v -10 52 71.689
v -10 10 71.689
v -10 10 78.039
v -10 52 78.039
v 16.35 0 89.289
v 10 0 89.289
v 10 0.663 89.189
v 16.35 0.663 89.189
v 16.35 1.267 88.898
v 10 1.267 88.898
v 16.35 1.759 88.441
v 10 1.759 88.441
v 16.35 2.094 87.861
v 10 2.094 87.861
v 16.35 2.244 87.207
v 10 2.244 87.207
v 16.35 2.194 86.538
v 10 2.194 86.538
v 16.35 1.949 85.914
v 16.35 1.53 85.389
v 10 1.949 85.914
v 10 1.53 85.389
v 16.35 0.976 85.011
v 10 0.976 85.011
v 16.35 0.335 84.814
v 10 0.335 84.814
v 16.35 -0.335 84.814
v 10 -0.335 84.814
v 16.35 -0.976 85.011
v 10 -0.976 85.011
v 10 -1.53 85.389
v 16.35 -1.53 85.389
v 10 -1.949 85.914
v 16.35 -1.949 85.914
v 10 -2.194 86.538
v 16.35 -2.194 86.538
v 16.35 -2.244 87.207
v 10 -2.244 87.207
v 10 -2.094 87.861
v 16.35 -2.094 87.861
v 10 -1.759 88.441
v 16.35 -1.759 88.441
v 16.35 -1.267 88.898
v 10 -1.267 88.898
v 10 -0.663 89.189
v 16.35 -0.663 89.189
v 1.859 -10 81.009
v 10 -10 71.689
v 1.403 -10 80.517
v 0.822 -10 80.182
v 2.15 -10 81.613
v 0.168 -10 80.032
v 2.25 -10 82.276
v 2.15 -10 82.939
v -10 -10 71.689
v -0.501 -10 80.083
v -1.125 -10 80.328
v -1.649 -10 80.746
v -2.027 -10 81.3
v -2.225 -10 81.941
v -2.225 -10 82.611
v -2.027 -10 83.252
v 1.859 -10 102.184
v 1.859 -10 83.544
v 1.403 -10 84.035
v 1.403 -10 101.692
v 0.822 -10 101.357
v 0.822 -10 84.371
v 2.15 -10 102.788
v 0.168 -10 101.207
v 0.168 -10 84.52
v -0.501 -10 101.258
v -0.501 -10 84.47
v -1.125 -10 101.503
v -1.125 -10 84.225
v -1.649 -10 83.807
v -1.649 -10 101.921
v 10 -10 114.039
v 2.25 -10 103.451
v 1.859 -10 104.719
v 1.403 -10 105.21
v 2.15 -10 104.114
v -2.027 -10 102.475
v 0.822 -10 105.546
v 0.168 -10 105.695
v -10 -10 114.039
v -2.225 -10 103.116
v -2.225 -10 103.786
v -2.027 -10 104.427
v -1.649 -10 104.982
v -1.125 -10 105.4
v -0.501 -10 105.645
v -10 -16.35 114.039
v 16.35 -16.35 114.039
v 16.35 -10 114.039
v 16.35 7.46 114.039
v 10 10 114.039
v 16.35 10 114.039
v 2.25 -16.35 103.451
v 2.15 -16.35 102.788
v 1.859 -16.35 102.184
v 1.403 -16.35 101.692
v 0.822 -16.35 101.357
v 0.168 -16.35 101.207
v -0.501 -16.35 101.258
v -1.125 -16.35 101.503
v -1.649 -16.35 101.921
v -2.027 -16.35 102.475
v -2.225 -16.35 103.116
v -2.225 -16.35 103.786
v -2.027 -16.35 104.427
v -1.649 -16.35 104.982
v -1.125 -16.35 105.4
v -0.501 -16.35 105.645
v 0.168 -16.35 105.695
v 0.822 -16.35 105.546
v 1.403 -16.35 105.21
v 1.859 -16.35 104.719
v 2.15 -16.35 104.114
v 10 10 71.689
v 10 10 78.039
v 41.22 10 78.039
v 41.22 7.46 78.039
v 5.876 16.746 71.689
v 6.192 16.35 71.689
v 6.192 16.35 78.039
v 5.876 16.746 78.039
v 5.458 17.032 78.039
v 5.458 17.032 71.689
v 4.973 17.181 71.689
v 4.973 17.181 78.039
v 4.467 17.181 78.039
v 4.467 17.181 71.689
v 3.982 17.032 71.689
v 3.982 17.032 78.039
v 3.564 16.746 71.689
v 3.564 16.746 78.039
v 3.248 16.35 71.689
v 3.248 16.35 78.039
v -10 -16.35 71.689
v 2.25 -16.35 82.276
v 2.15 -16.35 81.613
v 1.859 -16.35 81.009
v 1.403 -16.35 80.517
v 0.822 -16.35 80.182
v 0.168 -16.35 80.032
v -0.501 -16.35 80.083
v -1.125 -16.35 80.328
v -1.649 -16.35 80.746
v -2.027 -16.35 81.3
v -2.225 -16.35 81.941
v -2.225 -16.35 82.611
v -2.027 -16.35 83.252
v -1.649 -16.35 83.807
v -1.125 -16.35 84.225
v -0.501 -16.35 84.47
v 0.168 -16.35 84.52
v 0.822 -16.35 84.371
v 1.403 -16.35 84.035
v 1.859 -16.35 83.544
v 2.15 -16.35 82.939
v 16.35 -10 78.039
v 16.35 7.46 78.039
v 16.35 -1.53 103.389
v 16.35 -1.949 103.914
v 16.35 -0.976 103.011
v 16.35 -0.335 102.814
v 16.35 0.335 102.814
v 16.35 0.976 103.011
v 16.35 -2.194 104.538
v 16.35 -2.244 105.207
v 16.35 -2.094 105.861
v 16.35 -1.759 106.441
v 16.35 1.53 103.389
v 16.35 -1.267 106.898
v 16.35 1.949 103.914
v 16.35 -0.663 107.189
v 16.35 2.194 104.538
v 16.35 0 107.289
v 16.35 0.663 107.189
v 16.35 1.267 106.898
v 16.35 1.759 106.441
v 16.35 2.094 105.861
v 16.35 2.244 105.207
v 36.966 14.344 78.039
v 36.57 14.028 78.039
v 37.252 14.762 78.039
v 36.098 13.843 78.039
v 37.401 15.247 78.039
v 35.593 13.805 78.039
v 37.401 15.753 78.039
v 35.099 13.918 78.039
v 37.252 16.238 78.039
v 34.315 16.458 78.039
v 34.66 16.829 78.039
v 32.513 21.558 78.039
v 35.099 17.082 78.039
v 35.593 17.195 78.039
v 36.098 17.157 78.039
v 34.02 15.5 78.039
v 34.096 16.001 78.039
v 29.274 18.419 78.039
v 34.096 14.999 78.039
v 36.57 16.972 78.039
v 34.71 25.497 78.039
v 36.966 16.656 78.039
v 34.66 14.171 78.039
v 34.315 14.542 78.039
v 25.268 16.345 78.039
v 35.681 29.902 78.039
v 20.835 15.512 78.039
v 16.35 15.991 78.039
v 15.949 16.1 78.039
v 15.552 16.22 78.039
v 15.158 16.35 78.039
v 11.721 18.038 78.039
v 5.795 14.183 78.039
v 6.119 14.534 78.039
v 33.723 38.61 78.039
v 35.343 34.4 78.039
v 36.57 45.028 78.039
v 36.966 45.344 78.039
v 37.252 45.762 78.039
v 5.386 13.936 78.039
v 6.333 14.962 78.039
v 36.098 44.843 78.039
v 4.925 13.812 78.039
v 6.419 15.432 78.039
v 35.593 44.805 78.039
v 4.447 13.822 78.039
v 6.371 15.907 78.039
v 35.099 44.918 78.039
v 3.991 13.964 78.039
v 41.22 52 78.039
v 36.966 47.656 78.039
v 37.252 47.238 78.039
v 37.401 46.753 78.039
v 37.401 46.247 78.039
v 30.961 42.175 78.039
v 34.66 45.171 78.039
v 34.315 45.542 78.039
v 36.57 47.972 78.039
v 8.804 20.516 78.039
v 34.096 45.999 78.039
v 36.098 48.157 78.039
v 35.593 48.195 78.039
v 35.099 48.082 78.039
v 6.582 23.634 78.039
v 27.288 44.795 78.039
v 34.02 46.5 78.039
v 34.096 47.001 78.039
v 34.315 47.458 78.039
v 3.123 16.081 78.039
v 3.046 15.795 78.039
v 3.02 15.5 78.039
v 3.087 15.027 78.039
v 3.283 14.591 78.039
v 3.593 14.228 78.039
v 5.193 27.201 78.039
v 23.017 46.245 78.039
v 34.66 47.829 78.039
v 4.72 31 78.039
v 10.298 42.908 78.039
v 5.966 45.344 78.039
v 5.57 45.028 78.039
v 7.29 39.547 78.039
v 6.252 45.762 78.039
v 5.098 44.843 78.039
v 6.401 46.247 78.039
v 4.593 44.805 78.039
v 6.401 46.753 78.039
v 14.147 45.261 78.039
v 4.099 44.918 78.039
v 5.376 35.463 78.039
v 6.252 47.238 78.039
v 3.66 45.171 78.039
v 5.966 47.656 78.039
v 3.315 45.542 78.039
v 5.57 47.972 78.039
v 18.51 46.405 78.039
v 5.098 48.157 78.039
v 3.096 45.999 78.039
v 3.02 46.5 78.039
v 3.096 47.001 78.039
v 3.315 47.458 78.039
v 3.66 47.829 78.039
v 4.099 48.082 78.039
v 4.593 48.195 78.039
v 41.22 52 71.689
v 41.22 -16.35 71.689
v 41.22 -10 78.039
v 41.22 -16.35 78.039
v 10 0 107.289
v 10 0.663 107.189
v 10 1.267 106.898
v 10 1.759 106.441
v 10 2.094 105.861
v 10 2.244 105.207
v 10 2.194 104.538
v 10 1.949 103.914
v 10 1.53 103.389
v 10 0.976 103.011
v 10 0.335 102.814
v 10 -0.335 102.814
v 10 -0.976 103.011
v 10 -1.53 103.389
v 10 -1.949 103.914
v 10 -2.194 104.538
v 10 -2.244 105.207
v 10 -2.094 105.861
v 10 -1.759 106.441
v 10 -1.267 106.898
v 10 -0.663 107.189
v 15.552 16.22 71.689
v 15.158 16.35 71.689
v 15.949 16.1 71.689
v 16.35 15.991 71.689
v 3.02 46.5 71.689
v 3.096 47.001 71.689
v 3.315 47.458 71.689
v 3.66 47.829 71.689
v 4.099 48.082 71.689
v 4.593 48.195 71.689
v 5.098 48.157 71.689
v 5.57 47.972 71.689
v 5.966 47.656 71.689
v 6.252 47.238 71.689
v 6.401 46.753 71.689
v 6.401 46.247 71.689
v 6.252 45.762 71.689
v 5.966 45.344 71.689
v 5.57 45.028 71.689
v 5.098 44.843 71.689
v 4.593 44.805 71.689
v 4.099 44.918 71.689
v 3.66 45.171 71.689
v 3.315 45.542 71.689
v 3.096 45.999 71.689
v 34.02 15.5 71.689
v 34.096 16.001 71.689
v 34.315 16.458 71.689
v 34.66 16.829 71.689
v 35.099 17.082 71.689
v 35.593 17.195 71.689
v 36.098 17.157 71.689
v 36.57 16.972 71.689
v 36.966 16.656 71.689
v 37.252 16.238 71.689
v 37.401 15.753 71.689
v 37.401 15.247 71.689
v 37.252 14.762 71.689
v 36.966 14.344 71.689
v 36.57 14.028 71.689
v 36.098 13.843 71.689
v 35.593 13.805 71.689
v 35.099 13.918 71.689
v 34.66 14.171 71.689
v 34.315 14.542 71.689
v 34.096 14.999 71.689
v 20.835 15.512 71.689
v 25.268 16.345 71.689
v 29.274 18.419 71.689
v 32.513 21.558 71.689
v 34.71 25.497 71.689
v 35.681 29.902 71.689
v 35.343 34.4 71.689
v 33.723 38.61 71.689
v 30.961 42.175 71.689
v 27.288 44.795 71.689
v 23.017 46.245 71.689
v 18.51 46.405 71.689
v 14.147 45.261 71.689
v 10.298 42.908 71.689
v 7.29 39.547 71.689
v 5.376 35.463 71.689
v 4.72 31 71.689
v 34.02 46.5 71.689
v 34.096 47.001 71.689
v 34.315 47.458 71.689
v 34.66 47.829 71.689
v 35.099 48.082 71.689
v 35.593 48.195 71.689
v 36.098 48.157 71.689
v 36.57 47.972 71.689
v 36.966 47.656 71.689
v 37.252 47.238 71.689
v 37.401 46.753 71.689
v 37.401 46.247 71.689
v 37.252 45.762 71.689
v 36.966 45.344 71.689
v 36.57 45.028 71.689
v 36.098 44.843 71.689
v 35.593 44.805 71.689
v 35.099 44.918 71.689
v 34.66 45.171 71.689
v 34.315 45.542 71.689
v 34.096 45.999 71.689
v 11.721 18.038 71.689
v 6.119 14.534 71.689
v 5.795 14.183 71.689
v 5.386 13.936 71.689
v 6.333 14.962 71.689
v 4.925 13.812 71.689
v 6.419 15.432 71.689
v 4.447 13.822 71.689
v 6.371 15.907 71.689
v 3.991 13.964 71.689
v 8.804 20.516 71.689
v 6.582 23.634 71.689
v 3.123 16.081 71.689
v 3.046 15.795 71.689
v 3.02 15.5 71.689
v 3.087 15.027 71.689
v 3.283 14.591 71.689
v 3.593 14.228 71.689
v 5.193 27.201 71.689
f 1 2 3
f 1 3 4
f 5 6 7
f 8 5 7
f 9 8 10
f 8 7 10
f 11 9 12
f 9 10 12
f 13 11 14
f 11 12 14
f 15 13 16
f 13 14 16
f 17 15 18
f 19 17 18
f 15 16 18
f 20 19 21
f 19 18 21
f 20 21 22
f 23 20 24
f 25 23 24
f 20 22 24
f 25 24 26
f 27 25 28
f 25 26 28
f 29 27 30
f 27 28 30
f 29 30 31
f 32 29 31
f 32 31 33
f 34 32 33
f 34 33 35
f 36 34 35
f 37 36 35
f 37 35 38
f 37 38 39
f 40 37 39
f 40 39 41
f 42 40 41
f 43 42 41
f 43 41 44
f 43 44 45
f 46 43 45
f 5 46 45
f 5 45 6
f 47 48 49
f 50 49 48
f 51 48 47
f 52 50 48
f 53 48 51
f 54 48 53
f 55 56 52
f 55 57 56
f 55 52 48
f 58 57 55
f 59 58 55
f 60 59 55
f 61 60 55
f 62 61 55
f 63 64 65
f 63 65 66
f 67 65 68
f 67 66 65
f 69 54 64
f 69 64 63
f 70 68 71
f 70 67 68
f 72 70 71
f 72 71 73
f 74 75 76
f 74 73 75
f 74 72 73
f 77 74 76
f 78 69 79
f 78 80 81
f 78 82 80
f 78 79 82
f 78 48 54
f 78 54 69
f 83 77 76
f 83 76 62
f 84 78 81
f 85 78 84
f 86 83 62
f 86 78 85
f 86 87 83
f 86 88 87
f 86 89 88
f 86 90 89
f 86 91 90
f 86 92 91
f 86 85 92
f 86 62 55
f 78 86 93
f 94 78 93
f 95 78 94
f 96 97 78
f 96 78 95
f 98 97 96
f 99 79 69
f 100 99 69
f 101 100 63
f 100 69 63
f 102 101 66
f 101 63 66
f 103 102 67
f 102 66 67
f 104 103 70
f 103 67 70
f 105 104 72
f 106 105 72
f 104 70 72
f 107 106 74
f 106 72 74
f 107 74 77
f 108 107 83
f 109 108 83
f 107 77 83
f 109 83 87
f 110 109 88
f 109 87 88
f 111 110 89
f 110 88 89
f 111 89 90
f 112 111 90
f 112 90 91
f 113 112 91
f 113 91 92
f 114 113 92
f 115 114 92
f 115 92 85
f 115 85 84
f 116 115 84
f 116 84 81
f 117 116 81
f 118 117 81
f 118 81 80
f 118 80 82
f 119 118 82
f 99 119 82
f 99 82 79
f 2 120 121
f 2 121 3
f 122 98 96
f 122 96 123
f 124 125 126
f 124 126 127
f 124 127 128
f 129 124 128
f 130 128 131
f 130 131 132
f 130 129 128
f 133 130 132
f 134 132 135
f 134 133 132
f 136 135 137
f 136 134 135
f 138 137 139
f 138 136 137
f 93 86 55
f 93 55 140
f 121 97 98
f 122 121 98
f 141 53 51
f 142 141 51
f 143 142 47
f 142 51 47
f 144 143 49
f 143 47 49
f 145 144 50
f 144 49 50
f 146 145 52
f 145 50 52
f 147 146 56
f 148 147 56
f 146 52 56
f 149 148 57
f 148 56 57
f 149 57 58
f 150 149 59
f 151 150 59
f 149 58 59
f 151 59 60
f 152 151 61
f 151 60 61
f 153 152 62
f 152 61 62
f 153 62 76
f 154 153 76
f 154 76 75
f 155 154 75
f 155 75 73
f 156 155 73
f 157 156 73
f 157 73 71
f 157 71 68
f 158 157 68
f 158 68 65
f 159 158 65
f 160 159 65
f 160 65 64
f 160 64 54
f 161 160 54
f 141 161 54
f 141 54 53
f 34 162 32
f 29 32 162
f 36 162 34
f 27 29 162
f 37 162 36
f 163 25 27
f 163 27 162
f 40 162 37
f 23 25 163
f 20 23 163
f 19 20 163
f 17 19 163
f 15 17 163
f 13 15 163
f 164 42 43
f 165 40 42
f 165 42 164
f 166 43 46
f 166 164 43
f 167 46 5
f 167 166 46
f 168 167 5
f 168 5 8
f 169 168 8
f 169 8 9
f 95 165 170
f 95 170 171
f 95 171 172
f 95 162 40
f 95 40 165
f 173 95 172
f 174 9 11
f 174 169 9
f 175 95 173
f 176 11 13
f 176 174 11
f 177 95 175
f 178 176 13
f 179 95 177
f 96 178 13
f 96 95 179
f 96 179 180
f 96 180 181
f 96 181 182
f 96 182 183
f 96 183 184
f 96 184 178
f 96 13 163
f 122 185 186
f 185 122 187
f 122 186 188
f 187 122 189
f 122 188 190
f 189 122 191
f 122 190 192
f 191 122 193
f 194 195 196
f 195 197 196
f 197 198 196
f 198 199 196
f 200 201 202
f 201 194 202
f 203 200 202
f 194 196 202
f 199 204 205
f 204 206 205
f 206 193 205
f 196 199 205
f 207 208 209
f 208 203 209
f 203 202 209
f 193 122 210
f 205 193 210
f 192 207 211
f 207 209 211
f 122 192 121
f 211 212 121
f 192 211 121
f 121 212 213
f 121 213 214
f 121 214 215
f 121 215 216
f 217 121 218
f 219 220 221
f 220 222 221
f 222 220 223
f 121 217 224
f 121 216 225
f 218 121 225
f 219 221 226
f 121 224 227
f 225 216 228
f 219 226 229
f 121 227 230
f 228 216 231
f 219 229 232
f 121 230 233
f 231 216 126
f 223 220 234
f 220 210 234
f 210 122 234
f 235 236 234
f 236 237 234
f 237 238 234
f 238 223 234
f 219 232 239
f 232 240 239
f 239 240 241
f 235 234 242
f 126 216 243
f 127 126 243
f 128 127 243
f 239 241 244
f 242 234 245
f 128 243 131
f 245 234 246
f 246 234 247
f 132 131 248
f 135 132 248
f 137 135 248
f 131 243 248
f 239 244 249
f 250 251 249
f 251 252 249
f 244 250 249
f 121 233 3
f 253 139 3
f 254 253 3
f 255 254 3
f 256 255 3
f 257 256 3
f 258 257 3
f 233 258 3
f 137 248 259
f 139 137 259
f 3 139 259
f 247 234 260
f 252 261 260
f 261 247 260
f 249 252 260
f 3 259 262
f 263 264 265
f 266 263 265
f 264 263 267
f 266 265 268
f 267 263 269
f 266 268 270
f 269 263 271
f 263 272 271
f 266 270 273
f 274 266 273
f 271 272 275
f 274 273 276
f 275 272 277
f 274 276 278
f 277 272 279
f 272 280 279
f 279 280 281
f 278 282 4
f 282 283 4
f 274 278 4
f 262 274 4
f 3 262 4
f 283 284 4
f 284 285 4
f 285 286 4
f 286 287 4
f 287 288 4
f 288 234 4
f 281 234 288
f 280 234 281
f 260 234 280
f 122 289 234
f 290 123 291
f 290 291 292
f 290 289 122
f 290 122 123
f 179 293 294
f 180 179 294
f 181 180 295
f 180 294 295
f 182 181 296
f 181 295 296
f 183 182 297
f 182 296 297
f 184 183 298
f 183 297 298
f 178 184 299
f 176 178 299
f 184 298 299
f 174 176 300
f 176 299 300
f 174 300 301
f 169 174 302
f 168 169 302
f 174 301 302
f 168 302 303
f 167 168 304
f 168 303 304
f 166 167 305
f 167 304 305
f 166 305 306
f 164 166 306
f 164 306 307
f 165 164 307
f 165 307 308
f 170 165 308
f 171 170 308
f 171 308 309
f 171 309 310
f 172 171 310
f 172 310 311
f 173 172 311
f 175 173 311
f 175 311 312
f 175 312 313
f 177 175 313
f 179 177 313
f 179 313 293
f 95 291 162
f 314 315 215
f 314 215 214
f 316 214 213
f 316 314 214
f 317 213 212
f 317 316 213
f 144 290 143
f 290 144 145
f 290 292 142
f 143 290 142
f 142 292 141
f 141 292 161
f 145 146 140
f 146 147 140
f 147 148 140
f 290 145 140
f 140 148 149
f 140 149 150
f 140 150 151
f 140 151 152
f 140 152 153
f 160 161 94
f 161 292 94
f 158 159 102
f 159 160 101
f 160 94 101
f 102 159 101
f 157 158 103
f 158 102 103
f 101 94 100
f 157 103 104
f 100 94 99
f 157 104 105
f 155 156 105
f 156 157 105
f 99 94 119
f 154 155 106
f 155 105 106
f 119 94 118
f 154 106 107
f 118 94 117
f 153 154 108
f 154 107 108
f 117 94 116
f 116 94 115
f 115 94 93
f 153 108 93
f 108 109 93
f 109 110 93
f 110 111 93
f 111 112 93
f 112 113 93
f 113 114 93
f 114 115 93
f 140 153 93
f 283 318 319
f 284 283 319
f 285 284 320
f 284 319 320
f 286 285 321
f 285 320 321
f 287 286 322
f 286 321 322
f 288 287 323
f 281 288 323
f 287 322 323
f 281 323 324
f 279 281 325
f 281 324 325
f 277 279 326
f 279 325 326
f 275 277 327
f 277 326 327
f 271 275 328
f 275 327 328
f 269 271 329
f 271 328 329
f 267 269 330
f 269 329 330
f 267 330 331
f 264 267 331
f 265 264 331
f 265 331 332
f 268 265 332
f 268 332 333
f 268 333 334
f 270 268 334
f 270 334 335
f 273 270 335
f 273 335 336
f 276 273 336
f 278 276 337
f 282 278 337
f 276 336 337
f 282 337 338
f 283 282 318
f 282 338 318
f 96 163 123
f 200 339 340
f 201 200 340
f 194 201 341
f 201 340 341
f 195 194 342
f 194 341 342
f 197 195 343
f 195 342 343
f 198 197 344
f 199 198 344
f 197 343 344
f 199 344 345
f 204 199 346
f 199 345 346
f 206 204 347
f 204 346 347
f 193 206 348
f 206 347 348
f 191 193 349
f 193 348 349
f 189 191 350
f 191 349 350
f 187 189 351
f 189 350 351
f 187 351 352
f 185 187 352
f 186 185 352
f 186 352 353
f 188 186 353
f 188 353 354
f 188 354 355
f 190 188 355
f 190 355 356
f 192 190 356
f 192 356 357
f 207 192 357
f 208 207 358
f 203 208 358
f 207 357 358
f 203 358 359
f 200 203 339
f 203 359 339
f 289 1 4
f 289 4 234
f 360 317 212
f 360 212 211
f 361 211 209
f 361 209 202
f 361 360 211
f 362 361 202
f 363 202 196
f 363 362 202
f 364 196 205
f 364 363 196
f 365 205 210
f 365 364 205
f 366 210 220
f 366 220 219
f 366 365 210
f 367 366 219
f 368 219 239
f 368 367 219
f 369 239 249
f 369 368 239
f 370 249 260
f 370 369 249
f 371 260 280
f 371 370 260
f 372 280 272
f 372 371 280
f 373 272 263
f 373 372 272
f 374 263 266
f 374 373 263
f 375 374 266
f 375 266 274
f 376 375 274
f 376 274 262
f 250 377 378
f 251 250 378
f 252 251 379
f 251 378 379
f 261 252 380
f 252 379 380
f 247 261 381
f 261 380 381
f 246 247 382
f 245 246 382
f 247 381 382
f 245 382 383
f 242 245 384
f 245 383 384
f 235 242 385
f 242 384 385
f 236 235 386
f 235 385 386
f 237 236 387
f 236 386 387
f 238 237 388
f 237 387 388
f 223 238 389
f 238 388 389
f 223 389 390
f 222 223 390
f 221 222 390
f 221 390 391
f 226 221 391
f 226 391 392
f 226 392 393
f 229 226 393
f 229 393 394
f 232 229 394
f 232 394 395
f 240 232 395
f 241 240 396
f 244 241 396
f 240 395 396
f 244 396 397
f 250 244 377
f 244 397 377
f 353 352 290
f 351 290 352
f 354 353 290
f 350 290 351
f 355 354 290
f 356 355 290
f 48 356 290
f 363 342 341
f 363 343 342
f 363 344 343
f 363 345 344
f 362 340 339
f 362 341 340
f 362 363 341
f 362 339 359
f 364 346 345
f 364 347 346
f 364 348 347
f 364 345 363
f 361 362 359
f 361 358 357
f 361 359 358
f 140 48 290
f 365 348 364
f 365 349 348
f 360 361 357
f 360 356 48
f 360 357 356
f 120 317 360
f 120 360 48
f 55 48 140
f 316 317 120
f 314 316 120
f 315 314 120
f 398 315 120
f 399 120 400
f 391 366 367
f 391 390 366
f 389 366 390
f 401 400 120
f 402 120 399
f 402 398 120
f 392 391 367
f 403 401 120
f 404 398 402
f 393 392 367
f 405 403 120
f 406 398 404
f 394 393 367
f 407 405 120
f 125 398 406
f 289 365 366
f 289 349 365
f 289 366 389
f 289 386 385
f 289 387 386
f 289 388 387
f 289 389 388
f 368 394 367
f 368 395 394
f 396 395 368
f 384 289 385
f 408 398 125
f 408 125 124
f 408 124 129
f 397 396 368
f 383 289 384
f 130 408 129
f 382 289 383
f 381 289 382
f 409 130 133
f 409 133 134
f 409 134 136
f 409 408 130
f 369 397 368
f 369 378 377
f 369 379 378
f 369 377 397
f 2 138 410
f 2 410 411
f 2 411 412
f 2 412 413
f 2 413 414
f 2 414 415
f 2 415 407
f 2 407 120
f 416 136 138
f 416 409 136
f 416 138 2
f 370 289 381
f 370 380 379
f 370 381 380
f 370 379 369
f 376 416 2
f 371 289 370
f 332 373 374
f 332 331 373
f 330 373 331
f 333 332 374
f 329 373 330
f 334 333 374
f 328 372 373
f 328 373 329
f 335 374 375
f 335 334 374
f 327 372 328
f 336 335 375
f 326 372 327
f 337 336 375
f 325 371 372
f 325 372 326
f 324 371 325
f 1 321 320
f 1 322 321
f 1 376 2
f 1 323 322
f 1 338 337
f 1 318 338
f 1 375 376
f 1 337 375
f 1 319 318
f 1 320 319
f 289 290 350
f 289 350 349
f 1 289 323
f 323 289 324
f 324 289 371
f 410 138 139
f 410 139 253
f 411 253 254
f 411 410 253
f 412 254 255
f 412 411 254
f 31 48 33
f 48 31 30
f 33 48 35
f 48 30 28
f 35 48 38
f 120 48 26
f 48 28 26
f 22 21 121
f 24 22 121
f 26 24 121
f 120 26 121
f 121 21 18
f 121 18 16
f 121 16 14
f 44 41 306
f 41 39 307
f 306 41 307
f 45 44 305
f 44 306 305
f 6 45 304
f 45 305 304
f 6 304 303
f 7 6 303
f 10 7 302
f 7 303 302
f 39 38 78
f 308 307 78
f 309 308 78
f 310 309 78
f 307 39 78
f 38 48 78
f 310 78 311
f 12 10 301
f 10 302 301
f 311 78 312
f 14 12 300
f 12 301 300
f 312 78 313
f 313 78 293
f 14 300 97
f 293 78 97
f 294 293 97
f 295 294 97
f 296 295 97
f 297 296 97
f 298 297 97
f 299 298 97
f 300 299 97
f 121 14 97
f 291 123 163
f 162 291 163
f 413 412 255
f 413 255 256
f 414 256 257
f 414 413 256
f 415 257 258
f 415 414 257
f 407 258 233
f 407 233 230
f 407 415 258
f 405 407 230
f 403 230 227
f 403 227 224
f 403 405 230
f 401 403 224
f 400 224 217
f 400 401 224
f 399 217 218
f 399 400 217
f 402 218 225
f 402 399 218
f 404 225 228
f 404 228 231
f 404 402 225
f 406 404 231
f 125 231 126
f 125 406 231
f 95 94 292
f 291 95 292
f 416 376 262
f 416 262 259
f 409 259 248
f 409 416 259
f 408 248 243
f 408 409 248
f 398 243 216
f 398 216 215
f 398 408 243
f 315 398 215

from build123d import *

# Parameters (mm, degrees)
SKETCH2_W            = 6.35
SKETCH2_H            = 20
BOSS_EXTRUDE1_DEPTH  = 42.349999882
SKETCH3_R            = 1.7
SKETCH3_W            = 24.870089154
SKETCH3_H            = 26.35
SKETCH3_W_2          = 9.220089154
SKETCH3_H_2          = 42
BOSS_EXTRUDE2_DEPTH  = 6.35
BOSS_EXTRUDE4_DEPTH  = 6.35
M4_CLEARANCE_HOLE1_D = 4.5
M4_CLEARANCE_HOLE2_D = 4.5
BOSS_EXTRUDE5_DEPTH  = 2.54


with BuildPart() as part:
    # Sketch2 → Boss-Extrude1 (new body)
    with BuildSketch(Plane.XY.offset(114.038644373)):
        Polygon((16.35, -10), (10, -10), (-10, -10), (-10, -16.35), (16.35, -16.35), align=None)
        with Locations((13.175, 0)):
            Rectangle(SKETCH2_W, SKETCH2_H)
    extrude(amount=-BOSS_EXTRUDE1_DEPTH)

    # Sketch3 → Boss-Extrude2 (add)
    # profile 1 of 4: a face of its own
    with BuildSketch(Plane(origin=(0, 0, 71.688644491), x_dir=(-1, 0, 0), z_dir=(0, 0, -1))):
        with BuildLine():
            Line((-41.220089154, 10), (-16.35, 10))
            Line((-16.35, 10), (-16.35, 15.990922415))
            ThreePointArc((-16.35, 15.990922415), (-32.472362042, 40.493777386), (-4.720089154, 31))
            ThreePointArc((-4.720089154, 31), (-7.596369472, 22.006018601), (-15.157728044, 16.35))
            Line((-15.157728044, 16.35), (-6.19233234, 16.35))
            ThreePointArc((-6.19233234, 16.35), (-4.720089154, 17.2), (-3.247845967, 16.35))
            Line((-3.247845967, 16.35), (0.779910846, 16.35))
            Line((0.779910846, 16.35), (0.779910846, 52))
            Line((0.779910846, 52), (-41.220089154, 52))
            Line((-41.220089154, 52), (-41.220089154, 10))
        make_face()
        with Locations((-35.720089154, 15.5)):
            Circle(SKETCH3_R, mode=Mode.SUBTRACT)
        with Locations((-35.720089154, 46.5)):
            Circle(SKETCH3_R, mode=Mode.SUBTRACT)
        with Locations((-4.720089154, 46.5)):
            Circle(SKETCH3_R, mode=Mode.SUBTRACT)
    # profile 2 of 4: a face of its own
    with BuildSketch(Plane(origin=(0, 0, 71.688644491), x_dir=(-1, 0, 0), z_dir=(0, 0, -1))):
        with Locations((-28.785044577, -3.175)):
            Rectangle(SKETCH3_W, SKETCH3_H)
    # profile 3 of 4: a face of its own
    with BuildSketch(Plane(origin=(0, 0, 71.688644491), x_dir=(-1, 0, 0), z_dir=(0, 0, -1))):
        with BuildLine():
            Line((-16.35, 15.990922415), (-16.35, 10))
            Line((-16.35, 10), (-10, 10))
            Line((-10, 10), (0.779910846, 10))
            Line((0.779910846, 10), (0.779910846, 16.35))
            Line((0.779910846, 16.35), (-3.247845967, 16.35))
            ThreePointArc((-3.247845967, 16.35), (-3.078015249, 15.939992377), (-3.020089154, 15.5))
            ThreePointArc((-3.020089154, 15.5), (-5.16008153, 13.857926095), (-6.19233234, 16.35))
            Line((-6.19233234, 16.35), (-15.157728044, 16.35))
            ThreePointArc((-15.157728044, 16.35), (-15.750256819, 16.158483942), (-16.35, 15.990922415))
        make_face()
    # profile 4 of 4: a face of its own
    with BuildSketch(Plane(origin=(0, 0, 71.688644491), x_dir=(-1, 0, 0), z_dir=(0, 0, -1))):
        with Locations((5.389955423, 31)):
            Rectangle(SKETCH3_W_2, SKETCH3_H_2)
    extrude(amount=-BOSS_EXTRUDE2_DEPTH)

    # Sketch4 → Boss-Extrude4 (add)
    with BuildSketch(Plane.XZ.offset(16.35)):
        Polygon((16.35, 114.038644373), (41.220089154, 78.038644491), (16.35, 78.038644491), align=None)
    extrude(amount=-BOSS_EXTRUDE4_DEPTH)

    # M4 Clearance Hole1 (through all)
    with Locations(Plane(origin=(16.35, 0, 0), x_dir=(0, 0, -1), z_dir=(1, 0, 0))):
        with Locations((-105.038644403, 0), (-87.038644462, 0)):
            Hole(M4_CLEARANCE_HOLE1_D / 2)

    # M4 Clearance Hole2 (through all)
    with Locations(Plane(origin=(0, -16.35, 0), x_dir=(-1, 0, 0), z_dir=(0, -1, 0))):
        with Locations((0, -82.276144462), (0, -103.451144403)):
            Hole(M4_CLEARANCE_HOLE2_D / 2)

    # Sketch11 → Boss-Extrude5 (add)
    with BuildSketch(Plane(origin=(0, 10, 0), x_dir=(1, 0, 0), z_dir=(0, 1, 0))):
        Polygon((16.35, -114.038644373), (41.220089154, -78.038644491), (16.35, -78.038644491), align=None)
    extrude(amount=-BOSS_EXTRUDE5_DEPTH)


solid = part.part
